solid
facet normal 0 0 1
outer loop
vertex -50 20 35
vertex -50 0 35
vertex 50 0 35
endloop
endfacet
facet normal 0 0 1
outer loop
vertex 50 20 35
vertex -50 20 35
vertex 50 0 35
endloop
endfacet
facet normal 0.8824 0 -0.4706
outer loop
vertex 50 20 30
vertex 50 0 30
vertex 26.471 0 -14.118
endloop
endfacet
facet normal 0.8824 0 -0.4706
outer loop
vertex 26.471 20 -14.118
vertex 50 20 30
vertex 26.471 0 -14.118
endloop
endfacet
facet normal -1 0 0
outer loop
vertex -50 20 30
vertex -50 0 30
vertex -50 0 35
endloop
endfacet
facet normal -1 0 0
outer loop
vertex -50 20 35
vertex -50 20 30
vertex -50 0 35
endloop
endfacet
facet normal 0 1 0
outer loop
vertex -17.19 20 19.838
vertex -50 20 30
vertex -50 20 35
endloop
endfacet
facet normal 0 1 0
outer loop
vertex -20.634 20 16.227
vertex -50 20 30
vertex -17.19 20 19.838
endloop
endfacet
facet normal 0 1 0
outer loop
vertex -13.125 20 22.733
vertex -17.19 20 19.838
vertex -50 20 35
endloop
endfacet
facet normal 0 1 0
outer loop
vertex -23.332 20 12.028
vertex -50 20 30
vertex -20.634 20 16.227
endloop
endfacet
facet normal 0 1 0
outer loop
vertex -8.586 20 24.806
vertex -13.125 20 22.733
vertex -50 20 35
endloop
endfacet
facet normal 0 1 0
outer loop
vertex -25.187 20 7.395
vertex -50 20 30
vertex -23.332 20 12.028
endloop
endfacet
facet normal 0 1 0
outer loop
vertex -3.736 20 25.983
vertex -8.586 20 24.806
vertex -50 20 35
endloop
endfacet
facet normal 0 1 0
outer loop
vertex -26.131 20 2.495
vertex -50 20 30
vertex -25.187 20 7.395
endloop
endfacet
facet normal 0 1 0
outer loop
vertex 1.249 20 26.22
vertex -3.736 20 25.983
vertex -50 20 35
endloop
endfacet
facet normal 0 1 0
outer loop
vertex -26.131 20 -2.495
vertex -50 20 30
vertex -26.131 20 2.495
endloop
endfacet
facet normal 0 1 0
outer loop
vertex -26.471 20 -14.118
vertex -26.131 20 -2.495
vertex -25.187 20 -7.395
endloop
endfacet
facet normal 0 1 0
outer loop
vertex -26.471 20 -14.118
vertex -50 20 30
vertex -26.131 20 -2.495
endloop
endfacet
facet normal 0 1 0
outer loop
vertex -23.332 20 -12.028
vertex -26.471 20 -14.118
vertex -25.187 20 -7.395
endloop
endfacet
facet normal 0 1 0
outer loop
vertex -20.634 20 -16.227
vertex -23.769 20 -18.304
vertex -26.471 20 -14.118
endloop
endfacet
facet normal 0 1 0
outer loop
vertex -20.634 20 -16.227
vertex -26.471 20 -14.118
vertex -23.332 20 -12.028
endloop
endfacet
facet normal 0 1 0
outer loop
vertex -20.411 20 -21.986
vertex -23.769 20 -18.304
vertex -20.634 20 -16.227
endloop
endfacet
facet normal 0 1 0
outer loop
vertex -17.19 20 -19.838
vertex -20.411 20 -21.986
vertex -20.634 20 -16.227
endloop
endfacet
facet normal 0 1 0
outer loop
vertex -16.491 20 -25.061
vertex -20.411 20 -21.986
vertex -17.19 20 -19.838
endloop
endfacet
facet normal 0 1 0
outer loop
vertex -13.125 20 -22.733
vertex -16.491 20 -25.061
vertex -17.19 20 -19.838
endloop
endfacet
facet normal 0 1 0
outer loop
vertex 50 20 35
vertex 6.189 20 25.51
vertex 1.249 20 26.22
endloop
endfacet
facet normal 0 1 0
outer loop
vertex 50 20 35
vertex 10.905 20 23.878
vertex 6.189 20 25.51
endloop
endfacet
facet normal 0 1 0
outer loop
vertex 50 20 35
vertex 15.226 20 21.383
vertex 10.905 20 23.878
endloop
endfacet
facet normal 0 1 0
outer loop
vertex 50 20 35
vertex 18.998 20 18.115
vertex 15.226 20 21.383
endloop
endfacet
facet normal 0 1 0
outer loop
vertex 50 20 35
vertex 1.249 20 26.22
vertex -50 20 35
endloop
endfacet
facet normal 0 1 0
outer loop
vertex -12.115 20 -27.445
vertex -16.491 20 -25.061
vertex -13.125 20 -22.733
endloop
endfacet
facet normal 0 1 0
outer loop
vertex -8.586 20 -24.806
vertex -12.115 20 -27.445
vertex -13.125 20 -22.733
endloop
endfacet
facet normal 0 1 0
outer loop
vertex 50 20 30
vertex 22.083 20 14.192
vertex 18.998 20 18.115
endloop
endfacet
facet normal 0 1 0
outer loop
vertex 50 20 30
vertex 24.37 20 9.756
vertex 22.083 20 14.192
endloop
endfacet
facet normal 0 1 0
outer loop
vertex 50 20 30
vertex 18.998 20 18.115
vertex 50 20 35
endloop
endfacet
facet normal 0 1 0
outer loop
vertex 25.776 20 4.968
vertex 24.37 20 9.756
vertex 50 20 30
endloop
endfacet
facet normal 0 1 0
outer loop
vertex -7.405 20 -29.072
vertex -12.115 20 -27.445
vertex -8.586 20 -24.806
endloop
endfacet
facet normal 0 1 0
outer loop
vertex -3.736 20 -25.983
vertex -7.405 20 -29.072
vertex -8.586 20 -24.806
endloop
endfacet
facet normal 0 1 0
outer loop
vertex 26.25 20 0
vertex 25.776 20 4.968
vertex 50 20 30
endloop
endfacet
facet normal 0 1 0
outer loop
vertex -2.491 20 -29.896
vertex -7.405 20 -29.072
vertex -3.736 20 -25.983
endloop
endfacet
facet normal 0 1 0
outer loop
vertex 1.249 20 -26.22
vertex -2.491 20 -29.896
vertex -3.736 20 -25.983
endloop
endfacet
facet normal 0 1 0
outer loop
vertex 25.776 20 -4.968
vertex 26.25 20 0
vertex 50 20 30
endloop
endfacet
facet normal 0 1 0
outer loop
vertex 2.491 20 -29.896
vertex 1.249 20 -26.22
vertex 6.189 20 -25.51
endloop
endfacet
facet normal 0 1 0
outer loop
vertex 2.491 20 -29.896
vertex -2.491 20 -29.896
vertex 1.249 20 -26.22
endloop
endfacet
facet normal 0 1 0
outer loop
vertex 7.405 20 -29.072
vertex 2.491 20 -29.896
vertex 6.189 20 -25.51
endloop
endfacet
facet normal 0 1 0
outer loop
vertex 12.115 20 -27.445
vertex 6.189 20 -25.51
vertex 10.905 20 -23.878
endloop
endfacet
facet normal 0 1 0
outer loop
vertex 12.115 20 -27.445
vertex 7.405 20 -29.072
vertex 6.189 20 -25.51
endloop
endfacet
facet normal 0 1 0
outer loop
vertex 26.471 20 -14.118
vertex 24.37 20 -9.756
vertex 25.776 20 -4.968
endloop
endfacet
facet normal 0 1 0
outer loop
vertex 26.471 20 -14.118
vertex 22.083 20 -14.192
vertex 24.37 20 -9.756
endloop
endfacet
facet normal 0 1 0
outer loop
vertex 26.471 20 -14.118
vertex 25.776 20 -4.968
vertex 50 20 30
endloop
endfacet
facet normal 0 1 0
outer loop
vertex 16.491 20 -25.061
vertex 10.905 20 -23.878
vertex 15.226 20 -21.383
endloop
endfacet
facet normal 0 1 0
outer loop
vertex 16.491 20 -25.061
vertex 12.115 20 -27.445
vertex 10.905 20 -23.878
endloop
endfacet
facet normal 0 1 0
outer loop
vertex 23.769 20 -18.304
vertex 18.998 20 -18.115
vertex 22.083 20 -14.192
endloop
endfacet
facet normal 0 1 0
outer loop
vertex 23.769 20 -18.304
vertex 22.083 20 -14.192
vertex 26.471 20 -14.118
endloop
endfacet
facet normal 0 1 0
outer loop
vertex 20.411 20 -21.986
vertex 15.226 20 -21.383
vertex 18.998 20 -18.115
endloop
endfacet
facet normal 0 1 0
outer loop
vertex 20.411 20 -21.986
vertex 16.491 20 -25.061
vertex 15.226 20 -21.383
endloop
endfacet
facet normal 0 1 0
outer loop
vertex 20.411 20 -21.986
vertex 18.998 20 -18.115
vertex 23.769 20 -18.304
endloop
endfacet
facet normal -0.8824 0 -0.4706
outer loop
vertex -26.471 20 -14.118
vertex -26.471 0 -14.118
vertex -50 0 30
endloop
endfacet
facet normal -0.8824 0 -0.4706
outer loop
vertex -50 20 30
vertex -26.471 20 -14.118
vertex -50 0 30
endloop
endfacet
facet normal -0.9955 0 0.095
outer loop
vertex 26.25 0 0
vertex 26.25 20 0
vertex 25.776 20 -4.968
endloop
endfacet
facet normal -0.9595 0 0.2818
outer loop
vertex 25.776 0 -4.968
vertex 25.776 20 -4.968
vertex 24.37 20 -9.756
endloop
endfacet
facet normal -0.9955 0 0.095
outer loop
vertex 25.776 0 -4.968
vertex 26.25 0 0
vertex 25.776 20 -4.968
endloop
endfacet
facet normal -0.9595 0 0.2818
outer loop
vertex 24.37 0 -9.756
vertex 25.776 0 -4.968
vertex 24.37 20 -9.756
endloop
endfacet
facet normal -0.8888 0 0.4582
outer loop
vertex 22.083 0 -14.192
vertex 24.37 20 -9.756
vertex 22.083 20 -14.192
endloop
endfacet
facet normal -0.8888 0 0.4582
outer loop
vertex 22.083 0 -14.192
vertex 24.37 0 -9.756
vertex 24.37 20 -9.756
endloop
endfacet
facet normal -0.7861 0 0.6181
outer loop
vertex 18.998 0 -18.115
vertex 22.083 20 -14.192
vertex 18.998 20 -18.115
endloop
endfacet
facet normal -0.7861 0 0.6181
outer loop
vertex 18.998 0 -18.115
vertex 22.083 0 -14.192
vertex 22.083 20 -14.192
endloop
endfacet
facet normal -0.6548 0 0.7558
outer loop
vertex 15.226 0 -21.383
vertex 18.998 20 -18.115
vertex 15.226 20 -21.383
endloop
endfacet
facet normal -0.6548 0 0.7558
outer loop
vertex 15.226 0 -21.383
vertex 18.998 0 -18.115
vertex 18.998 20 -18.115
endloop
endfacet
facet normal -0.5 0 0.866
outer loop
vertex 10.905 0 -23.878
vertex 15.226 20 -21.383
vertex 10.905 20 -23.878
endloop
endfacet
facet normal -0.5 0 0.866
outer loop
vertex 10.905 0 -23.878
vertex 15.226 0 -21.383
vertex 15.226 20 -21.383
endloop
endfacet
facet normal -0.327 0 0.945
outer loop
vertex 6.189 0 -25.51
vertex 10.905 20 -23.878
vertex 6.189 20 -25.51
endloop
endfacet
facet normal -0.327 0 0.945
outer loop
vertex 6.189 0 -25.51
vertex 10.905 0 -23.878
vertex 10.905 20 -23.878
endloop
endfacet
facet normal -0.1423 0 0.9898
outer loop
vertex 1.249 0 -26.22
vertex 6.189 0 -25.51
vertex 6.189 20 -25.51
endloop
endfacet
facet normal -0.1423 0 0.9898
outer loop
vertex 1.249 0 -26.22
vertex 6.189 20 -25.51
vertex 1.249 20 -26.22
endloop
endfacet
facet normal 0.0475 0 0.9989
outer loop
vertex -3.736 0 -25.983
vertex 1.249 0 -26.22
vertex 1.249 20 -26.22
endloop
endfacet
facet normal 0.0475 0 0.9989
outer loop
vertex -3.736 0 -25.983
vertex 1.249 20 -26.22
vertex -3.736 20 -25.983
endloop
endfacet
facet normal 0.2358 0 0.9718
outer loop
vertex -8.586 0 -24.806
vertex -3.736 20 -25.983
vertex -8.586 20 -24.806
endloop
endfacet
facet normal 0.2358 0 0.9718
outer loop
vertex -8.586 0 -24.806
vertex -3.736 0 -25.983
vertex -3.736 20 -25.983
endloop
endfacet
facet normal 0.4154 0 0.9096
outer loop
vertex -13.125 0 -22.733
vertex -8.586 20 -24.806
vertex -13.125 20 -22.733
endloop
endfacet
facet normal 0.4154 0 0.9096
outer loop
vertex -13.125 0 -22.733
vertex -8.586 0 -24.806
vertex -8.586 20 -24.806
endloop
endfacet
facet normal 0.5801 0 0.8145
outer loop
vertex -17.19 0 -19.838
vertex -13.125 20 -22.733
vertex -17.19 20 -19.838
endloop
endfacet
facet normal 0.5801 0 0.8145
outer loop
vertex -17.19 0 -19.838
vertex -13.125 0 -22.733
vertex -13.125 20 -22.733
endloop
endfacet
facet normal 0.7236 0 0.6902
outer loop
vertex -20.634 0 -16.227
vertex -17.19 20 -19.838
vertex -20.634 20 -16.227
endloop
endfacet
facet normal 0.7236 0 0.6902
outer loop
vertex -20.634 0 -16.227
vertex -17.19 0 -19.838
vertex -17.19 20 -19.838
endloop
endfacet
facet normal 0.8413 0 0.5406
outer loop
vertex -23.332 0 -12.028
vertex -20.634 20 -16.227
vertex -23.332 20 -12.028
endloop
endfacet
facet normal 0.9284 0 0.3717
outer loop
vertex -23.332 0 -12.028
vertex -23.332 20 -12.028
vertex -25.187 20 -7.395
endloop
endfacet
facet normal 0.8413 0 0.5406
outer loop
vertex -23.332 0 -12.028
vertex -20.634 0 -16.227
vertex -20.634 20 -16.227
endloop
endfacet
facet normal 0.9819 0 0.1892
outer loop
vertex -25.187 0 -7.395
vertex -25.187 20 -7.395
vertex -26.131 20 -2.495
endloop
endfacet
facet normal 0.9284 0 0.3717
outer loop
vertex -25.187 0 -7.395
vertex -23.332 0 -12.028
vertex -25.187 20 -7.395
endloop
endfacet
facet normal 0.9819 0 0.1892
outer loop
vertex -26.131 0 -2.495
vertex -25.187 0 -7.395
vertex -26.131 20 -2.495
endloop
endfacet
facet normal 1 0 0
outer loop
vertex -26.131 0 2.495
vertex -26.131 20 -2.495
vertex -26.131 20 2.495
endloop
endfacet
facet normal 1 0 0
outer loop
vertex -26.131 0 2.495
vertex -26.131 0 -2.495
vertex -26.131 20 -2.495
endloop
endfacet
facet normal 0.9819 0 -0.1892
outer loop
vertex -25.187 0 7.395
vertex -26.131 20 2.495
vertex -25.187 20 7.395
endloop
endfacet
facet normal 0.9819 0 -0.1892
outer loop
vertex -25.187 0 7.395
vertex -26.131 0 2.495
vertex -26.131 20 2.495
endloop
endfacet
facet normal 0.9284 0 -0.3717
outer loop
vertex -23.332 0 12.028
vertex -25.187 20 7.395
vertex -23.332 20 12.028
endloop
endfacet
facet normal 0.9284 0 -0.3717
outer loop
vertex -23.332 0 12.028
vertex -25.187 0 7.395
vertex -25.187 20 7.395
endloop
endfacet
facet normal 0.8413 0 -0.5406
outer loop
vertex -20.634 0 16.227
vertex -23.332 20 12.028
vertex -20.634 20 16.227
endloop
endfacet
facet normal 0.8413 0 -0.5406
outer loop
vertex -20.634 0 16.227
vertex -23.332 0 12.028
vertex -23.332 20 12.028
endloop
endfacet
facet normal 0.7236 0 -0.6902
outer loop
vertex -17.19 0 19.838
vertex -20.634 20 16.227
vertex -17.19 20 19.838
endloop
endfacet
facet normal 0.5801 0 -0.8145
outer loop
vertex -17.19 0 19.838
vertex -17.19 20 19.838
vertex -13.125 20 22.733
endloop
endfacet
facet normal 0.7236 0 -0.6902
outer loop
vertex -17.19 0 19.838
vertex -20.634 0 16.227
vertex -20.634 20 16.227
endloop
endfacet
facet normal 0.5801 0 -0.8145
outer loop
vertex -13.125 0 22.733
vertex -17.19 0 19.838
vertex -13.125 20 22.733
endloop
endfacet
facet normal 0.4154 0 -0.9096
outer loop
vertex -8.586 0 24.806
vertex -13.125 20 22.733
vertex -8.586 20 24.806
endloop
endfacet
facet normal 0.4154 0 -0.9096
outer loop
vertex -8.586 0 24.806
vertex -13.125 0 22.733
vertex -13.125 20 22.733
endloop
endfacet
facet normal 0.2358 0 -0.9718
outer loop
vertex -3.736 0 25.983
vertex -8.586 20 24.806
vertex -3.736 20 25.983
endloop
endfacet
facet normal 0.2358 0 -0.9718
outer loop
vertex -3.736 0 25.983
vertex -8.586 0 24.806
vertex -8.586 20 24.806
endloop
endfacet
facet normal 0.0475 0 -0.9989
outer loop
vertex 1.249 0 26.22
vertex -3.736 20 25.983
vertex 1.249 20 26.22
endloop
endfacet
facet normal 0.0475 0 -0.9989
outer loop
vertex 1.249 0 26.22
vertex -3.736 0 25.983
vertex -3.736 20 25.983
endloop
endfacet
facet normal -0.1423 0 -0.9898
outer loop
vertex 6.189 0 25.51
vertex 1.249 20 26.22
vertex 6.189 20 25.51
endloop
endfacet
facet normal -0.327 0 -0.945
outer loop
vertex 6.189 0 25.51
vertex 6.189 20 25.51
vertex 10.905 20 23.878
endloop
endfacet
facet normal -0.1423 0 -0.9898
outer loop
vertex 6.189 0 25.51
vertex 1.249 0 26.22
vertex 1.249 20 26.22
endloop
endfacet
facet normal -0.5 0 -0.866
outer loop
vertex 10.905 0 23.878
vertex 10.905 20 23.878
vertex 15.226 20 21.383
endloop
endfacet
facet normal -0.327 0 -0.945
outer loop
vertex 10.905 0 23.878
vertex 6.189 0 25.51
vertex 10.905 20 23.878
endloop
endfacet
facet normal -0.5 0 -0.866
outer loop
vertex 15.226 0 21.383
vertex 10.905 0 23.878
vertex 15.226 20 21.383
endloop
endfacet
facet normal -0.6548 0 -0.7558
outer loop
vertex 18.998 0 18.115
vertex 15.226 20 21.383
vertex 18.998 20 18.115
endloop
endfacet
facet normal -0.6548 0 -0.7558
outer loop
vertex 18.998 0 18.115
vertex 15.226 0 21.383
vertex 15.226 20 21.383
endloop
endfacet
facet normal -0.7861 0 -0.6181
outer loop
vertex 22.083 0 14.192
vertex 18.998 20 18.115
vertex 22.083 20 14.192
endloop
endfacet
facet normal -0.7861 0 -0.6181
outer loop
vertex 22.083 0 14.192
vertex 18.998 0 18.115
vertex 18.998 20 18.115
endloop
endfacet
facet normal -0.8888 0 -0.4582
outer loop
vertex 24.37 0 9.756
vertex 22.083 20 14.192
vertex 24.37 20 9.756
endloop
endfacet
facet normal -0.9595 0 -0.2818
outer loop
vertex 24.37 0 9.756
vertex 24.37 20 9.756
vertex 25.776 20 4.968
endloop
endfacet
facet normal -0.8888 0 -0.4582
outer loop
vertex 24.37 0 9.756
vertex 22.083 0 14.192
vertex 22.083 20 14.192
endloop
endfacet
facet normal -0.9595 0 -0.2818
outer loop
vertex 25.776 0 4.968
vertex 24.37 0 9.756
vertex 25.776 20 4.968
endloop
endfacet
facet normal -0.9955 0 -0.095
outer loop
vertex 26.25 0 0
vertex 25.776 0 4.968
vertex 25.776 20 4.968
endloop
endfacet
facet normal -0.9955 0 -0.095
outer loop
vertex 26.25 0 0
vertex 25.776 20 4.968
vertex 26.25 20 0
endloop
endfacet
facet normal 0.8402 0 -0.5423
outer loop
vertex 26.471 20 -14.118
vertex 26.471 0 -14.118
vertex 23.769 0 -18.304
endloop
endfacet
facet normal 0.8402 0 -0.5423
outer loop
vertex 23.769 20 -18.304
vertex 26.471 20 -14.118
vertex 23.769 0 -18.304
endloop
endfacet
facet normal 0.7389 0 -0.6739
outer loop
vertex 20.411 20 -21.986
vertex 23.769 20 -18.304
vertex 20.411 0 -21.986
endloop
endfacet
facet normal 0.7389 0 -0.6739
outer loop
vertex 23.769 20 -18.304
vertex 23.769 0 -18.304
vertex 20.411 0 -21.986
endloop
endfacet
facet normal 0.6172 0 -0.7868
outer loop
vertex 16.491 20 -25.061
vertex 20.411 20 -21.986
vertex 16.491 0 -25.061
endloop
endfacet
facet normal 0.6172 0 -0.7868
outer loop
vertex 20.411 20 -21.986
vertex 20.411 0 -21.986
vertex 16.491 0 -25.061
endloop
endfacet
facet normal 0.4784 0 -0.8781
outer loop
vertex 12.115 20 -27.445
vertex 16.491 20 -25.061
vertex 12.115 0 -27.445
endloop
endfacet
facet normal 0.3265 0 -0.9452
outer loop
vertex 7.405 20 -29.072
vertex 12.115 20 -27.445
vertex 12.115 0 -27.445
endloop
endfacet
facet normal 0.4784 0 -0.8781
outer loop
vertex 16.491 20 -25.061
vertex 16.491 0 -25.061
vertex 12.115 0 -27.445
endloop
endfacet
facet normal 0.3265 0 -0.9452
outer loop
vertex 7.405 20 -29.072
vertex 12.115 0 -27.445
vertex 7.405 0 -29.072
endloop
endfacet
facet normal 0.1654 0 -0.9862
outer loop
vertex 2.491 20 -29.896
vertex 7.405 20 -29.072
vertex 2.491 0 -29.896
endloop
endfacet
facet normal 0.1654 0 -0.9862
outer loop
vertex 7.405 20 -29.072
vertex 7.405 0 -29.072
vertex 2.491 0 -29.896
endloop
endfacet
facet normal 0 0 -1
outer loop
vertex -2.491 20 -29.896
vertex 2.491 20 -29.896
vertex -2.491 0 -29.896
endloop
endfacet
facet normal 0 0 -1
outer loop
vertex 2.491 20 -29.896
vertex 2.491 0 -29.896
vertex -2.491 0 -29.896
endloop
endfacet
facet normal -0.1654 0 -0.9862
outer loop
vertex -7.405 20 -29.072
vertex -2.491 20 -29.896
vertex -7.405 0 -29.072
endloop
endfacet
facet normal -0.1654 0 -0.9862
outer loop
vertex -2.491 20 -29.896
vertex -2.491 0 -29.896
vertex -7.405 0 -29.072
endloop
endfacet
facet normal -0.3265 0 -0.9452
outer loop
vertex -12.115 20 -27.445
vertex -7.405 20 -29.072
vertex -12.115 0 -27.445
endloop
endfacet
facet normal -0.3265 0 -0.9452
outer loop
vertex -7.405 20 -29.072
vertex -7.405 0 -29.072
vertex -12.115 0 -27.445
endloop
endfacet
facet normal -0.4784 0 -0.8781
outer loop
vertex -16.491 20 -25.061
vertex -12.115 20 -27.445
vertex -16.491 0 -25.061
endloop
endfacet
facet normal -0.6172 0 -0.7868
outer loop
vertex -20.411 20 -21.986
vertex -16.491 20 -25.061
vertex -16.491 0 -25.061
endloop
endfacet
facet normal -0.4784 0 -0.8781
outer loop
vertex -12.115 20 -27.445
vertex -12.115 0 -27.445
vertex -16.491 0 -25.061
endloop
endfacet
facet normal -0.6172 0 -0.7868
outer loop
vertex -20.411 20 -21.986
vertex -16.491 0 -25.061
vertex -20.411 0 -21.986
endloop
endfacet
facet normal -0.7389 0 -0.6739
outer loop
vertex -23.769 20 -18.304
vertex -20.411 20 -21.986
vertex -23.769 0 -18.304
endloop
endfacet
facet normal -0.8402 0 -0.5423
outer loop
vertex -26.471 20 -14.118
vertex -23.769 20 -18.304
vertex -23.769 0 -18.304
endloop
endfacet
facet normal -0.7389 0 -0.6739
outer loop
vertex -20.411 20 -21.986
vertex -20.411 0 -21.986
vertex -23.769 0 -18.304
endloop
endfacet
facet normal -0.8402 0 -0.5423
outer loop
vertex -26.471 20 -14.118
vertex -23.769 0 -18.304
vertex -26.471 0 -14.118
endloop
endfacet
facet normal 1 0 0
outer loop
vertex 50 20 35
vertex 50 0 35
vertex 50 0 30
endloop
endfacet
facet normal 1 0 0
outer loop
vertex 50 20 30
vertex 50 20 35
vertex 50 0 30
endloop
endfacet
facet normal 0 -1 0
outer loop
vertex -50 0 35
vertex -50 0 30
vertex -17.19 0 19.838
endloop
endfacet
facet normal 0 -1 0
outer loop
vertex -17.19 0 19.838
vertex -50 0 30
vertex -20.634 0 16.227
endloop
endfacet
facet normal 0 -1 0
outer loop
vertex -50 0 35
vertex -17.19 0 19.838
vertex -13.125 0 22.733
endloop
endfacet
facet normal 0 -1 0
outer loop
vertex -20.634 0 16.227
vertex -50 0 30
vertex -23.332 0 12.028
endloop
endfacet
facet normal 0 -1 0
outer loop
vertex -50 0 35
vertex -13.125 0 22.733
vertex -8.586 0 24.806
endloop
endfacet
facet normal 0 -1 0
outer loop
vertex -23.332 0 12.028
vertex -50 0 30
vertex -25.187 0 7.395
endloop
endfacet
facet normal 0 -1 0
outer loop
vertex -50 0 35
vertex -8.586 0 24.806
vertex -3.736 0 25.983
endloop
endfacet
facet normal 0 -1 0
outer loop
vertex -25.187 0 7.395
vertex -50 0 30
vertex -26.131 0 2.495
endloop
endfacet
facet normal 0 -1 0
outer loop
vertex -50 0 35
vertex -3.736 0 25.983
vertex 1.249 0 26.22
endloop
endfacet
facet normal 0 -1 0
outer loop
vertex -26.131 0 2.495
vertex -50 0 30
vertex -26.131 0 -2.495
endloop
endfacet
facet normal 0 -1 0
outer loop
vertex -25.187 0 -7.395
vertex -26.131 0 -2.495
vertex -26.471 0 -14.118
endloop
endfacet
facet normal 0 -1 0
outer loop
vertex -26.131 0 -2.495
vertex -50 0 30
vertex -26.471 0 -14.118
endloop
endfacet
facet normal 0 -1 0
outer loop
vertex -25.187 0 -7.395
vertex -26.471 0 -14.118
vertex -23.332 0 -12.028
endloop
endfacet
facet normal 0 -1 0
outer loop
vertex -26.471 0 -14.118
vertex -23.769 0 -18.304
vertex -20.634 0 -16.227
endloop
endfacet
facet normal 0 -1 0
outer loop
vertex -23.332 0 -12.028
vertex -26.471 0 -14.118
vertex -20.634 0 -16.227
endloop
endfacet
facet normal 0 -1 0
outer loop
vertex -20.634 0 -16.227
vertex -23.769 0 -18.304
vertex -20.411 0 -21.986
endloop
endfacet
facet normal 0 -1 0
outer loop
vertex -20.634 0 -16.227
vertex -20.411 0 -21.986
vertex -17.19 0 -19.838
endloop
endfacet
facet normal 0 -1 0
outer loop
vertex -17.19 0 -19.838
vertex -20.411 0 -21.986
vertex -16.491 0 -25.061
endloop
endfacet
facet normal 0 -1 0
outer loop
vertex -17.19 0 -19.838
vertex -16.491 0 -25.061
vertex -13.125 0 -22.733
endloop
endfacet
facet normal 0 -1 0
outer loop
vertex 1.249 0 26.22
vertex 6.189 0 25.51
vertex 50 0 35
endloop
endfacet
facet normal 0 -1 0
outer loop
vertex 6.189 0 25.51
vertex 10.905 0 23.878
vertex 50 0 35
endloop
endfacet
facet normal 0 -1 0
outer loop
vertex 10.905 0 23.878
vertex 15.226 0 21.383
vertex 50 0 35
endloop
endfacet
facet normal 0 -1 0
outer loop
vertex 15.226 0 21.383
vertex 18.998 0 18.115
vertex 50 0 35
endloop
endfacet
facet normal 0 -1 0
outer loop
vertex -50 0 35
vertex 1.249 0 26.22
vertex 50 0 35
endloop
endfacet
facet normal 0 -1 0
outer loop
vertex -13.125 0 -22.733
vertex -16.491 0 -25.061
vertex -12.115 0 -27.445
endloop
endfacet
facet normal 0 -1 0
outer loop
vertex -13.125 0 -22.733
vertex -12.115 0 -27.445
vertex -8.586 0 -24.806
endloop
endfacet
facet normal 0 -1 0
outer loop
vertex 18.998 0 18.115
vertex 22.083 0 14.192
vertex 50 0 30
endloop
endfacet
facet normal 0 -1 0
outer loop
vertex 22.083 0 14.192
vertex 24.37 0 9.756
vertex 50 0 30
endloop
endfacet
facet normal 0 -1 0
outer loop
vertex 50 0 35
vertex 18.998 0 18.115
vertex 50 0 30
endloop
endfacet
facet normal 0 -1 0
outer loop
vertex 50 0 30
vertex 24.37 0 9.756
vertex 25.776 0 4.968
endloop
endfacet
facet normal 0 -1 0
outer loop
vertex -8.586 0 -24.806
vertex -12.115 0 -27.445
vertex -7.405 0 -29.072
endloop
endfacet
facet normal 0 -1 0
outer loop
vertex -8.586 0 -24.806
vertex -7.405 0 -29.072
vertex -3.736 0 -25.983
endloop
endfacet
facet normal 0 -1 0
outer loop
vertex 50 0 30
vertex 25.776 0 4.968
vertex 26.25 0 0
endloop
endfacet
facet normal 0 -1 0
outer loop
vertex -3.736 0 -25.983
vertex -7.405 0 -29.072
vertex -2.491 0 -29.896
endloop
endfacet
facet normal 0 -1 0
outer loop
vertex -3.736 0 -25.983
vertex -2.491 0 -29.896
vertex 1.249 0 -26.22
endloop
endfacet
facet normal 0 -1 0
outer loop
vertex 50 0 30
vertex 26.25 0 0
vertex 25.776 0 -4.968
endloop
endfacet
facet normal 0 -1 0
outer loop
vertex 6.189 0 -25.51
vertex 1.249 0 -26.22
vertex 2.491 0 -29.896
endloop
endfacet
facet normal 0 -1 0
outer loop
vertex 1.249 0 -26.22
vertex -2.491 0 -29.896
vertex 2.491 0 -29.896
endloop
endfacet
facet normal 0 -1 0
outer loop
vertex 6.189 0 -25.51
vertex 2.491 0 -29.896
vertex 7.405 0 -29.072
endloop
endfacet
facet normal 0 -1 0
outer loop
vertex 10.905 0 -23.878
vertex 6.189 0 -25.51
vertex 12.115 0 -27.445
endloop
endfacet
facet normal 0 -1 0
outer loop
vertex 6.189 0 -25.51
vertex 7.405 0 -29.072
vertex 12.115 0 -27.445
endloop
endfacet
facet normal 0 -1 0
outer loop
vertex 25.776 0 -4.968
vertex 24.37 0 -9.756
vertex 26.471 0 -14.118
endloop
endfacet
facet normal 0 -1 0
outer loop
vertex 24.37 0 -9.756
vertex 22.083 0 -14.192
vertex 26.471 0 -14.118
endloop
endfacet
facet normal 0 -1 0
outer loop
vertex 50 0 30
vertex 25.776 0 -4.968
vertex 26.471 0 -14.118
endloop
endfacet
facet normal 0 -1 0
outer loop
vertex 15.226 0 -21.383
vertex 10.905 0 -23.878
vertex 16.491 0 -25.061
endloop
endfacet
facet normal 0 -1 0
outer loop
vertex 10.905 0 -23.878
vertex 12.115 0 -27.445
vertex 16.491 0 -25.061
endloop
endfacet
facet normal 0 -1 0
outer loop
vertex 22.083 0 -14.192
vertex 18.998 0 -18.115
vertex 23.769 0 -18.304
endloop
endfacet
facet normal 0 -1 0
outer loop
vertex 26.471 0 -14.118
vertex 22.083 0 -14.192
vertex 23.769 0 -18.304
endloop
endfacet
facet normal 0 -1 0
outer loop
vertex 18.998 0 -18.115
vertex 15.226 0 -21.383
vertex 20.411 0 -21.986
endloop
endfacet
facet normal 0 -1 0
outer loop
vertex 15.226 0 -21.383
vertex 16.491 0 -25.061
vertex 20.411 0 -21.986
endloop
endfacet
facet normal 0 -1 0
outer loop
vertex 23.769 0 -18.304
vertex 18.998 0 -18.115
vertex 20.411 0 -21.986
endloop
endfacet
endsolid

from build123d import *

# Parameters (mm, degrees)
SKETCH1_R           = 30
BOSS_EXTRUDE1_DEPTH = 20
SKETCH2_R           = 26.25
CUT_EXTRUDE1_DEPTH  = 20


with BuildPart() as part:
    # Sketch1 → Boss-Extrude1 (new body)
    with BuildSketch(Plane(origin=(0, 0, 0), x_dir=(1, 0, 0), z_dir=(0, 1, 0))):
        Circle(SKETCH1_R)
        with BuildLine():
            Line((-26.470588235, 14.117647059), (-50, -30))
            Line((-50, -30), (-50, -35))
            Line((-50, -35), (50, -35))
            Line((50, -35), (50, -30))
            Line((50, -30), (26.470588235, 14.117647059))
            ThreePointArc((26.470588235, 14.117647059), (29.104275004, 7.276068751), (30, 0))
            ThreePointArc((30, 0), (-7.276068751, -29.104275004), (-26.470588235, 14.117647059))
        make_face()
    extrude(amount=BOSS_EXTRUDE1_DEPTH)

    # Sketch2 → Cut-Extrude1 (cut)
    with BuildSketch(Plane(origin=(0, 0, 0), x_dir=(1, 0, 0), z_dir=(0, 1, 0))):
        Circle(SKETCH2_R)
    extrude(amount=CUT_EXTRUDE1_DEPTH, mode=Mode.SUBTRACT)


solid = part.part
